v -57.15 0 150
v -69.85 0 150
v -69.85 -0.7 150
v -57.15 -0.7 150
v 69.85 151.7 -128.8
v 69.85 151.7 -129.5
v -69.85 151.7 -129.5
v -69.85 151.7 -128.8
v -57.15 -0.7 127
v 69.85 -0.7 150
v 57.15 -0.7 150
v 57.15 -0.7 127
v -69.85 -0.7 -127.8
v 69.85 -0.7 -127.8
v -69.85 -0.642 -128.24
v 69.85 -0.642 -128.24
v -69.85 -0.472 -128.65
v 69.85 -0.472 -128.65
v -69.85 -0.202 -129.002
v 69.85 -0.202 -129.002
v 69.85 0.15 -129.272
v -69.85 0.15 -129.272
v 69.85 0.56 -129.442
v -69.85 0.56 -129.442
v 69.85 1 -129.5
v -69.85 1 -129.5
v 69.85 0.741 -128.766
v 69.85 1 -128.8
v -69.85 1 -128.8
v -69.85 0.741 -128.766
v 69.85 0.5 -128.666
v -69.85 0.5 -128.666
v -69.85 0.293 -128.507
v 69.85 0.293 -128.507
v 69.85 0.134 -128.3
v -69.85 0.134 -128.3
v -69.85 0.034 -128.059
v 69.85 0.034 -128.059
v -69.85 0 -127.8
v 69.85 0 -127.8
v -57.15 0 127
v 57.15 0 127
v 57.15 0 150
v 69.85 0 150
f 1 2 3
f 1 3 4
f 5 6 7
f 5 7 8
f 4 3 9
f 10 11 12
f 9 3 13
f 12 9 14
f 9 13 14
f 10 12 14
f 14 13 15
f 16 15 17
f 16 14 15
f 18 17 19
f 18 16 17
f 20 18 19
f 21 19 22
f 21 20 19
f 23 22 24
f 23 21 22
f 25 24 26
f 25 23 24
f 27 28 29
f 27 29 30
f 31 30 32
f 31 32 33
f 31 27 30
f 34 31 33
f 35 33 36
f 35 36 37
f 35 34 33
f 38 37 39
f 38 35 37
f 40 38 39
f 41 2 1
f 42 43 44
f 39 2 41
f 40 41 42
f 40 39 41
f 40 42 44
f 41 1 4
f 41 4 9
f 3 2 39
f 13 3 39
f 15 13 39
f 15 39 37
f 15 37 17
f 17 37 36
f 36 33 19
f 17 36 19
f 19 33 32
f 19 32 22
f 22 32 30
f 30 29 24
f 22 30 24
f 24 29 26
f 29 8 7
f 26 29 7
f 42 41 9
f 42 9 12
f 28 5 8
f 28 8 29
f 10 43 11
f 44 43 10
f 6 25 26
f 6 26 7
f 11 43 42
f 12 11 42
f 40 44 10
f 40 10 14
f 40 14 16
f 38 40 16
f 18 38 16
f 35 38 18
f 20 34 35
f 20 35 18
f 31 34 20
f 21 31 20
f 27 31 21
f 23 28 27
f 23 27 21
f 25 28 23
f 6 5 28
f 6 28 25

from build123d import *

# Parameters (mm, degrees)
SKETCH1_W          = 139.7
SKETCH1_H          = 254
BASE_FLANGE1_DEPTH = 0.7
EDGE_FLANGE1_DEPTH = 139.7
SKETCH9_W          = 12.7
SKETCH9_H          = 23
TAB1_DEPTH         = 0.7
SKETCH12_W         = 12.7
SKETCH12_H         = 23
TAB2_DEPTH         = 0.7


# Sheet-metal steps are written as plain solids
with BuildPart() as part:
    # Sketch1 → Base-Flange1 (new body)
    with BuildSketch(Plane(origin=(0, 0, 0), x_dir=(1, 0, 0), z_dir=(0, 1, 0))):
        Rectangle(SKETCH1_W, SKETCH1_H)
    extrude(amount=-BASE_FLANGE1_DEPTH)

    # Edge-Flange1 section (across the edge) → Edge-Flange1 (add)
    with BuildSketch(Plane(origin=(69.85, 0, -128.8), x_dir=(0, 0, 1), z_dir=(-1, 0, 0))):
        with BuildLine():
            Line((-0.7, 1), (-0.7, 151.7))
            Line((-0.7, 151.7), (0, 151.7))
            Line((0, 151.7), (0, 1))
            ThreePointArc((0, 1), (0.292893219, 0.292893219), (1, 0))
            Line((1, 0), (1.8, 0))
            Line((1.8, 0), (1.8, -0.7))
            Line((1.8, -0.7), (1, -0.7))
            ThreePointArc((1, -0.7), (-0.202081528, -0.202081528), (-0.7, 1))
        make_face()
    extrude(amount=EDGE_FLANGE1_DEPTH)

    # Sketch9 → Tab1 (add)
    with BuildSketch(Plane(origin=(0, 0, 0), x_dir=(1, 0, 0), z_dir=(0, 1, 0))):
        with Locations((-63.5, -138.5)):
            Rectangle(SKETCH9_W, SKETCH9_H)
    extrude(amount=-TAB1_DEPTH)

    # Sketch12 → Tab2 (add)
    with BuildSketch(Plane(origin=(0, 0, 0), x_dir=(1, 0, 0), z_dir=(0, 1, 0))):
        with Locations((63.5, -138.5)):
            Rectangle(SKETCH12_W, SKETCH12_H)
    extrude(amount=-TAB2_DEPTH)


solid = part.part
